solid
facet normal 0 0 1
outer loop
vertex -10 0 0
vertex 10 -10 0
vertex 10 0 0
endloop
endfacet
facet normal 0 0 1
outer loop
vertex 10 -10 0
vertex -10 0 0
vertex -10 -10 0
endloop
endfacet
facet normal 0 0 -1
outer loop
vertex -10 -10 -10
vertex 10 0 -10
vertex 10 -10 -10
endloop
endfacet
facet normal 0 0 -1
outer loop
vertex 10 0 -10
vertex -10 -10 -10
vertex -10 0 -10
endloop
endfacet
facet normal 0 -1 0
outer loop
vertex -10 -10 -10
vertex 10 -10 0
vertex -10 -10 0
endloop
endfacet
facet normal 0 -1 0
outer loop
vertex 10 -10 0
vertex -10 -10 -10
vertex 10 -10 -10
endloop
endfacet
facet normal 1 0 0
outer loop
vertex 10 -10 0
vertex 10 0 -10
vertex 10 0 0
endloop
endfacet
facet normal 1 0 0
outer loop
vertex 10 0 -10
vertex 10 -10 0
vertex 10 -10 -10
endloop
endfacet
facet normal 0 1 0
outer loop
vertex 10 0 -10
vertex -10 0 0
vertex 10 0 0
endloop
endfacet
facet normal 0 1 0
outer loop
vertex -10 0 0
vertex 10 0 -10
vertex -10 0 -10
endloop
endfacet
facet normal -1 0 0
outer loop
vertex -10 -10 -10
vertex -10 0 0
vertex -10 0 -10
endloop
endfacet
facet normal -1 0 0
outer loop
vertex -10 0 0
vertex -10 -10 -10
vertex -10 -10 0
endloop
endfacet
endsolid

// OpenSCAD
module mycube(side=10, height=0, width=0, depth=0) {
    h = height ? height : side;
    w = width ? width : side;
    d = depth ? depth : side;
    cube([h, w, d]);
}

// Create a cube with a height of 10
translate([-10,-10,-10]) mycube(height=20);
